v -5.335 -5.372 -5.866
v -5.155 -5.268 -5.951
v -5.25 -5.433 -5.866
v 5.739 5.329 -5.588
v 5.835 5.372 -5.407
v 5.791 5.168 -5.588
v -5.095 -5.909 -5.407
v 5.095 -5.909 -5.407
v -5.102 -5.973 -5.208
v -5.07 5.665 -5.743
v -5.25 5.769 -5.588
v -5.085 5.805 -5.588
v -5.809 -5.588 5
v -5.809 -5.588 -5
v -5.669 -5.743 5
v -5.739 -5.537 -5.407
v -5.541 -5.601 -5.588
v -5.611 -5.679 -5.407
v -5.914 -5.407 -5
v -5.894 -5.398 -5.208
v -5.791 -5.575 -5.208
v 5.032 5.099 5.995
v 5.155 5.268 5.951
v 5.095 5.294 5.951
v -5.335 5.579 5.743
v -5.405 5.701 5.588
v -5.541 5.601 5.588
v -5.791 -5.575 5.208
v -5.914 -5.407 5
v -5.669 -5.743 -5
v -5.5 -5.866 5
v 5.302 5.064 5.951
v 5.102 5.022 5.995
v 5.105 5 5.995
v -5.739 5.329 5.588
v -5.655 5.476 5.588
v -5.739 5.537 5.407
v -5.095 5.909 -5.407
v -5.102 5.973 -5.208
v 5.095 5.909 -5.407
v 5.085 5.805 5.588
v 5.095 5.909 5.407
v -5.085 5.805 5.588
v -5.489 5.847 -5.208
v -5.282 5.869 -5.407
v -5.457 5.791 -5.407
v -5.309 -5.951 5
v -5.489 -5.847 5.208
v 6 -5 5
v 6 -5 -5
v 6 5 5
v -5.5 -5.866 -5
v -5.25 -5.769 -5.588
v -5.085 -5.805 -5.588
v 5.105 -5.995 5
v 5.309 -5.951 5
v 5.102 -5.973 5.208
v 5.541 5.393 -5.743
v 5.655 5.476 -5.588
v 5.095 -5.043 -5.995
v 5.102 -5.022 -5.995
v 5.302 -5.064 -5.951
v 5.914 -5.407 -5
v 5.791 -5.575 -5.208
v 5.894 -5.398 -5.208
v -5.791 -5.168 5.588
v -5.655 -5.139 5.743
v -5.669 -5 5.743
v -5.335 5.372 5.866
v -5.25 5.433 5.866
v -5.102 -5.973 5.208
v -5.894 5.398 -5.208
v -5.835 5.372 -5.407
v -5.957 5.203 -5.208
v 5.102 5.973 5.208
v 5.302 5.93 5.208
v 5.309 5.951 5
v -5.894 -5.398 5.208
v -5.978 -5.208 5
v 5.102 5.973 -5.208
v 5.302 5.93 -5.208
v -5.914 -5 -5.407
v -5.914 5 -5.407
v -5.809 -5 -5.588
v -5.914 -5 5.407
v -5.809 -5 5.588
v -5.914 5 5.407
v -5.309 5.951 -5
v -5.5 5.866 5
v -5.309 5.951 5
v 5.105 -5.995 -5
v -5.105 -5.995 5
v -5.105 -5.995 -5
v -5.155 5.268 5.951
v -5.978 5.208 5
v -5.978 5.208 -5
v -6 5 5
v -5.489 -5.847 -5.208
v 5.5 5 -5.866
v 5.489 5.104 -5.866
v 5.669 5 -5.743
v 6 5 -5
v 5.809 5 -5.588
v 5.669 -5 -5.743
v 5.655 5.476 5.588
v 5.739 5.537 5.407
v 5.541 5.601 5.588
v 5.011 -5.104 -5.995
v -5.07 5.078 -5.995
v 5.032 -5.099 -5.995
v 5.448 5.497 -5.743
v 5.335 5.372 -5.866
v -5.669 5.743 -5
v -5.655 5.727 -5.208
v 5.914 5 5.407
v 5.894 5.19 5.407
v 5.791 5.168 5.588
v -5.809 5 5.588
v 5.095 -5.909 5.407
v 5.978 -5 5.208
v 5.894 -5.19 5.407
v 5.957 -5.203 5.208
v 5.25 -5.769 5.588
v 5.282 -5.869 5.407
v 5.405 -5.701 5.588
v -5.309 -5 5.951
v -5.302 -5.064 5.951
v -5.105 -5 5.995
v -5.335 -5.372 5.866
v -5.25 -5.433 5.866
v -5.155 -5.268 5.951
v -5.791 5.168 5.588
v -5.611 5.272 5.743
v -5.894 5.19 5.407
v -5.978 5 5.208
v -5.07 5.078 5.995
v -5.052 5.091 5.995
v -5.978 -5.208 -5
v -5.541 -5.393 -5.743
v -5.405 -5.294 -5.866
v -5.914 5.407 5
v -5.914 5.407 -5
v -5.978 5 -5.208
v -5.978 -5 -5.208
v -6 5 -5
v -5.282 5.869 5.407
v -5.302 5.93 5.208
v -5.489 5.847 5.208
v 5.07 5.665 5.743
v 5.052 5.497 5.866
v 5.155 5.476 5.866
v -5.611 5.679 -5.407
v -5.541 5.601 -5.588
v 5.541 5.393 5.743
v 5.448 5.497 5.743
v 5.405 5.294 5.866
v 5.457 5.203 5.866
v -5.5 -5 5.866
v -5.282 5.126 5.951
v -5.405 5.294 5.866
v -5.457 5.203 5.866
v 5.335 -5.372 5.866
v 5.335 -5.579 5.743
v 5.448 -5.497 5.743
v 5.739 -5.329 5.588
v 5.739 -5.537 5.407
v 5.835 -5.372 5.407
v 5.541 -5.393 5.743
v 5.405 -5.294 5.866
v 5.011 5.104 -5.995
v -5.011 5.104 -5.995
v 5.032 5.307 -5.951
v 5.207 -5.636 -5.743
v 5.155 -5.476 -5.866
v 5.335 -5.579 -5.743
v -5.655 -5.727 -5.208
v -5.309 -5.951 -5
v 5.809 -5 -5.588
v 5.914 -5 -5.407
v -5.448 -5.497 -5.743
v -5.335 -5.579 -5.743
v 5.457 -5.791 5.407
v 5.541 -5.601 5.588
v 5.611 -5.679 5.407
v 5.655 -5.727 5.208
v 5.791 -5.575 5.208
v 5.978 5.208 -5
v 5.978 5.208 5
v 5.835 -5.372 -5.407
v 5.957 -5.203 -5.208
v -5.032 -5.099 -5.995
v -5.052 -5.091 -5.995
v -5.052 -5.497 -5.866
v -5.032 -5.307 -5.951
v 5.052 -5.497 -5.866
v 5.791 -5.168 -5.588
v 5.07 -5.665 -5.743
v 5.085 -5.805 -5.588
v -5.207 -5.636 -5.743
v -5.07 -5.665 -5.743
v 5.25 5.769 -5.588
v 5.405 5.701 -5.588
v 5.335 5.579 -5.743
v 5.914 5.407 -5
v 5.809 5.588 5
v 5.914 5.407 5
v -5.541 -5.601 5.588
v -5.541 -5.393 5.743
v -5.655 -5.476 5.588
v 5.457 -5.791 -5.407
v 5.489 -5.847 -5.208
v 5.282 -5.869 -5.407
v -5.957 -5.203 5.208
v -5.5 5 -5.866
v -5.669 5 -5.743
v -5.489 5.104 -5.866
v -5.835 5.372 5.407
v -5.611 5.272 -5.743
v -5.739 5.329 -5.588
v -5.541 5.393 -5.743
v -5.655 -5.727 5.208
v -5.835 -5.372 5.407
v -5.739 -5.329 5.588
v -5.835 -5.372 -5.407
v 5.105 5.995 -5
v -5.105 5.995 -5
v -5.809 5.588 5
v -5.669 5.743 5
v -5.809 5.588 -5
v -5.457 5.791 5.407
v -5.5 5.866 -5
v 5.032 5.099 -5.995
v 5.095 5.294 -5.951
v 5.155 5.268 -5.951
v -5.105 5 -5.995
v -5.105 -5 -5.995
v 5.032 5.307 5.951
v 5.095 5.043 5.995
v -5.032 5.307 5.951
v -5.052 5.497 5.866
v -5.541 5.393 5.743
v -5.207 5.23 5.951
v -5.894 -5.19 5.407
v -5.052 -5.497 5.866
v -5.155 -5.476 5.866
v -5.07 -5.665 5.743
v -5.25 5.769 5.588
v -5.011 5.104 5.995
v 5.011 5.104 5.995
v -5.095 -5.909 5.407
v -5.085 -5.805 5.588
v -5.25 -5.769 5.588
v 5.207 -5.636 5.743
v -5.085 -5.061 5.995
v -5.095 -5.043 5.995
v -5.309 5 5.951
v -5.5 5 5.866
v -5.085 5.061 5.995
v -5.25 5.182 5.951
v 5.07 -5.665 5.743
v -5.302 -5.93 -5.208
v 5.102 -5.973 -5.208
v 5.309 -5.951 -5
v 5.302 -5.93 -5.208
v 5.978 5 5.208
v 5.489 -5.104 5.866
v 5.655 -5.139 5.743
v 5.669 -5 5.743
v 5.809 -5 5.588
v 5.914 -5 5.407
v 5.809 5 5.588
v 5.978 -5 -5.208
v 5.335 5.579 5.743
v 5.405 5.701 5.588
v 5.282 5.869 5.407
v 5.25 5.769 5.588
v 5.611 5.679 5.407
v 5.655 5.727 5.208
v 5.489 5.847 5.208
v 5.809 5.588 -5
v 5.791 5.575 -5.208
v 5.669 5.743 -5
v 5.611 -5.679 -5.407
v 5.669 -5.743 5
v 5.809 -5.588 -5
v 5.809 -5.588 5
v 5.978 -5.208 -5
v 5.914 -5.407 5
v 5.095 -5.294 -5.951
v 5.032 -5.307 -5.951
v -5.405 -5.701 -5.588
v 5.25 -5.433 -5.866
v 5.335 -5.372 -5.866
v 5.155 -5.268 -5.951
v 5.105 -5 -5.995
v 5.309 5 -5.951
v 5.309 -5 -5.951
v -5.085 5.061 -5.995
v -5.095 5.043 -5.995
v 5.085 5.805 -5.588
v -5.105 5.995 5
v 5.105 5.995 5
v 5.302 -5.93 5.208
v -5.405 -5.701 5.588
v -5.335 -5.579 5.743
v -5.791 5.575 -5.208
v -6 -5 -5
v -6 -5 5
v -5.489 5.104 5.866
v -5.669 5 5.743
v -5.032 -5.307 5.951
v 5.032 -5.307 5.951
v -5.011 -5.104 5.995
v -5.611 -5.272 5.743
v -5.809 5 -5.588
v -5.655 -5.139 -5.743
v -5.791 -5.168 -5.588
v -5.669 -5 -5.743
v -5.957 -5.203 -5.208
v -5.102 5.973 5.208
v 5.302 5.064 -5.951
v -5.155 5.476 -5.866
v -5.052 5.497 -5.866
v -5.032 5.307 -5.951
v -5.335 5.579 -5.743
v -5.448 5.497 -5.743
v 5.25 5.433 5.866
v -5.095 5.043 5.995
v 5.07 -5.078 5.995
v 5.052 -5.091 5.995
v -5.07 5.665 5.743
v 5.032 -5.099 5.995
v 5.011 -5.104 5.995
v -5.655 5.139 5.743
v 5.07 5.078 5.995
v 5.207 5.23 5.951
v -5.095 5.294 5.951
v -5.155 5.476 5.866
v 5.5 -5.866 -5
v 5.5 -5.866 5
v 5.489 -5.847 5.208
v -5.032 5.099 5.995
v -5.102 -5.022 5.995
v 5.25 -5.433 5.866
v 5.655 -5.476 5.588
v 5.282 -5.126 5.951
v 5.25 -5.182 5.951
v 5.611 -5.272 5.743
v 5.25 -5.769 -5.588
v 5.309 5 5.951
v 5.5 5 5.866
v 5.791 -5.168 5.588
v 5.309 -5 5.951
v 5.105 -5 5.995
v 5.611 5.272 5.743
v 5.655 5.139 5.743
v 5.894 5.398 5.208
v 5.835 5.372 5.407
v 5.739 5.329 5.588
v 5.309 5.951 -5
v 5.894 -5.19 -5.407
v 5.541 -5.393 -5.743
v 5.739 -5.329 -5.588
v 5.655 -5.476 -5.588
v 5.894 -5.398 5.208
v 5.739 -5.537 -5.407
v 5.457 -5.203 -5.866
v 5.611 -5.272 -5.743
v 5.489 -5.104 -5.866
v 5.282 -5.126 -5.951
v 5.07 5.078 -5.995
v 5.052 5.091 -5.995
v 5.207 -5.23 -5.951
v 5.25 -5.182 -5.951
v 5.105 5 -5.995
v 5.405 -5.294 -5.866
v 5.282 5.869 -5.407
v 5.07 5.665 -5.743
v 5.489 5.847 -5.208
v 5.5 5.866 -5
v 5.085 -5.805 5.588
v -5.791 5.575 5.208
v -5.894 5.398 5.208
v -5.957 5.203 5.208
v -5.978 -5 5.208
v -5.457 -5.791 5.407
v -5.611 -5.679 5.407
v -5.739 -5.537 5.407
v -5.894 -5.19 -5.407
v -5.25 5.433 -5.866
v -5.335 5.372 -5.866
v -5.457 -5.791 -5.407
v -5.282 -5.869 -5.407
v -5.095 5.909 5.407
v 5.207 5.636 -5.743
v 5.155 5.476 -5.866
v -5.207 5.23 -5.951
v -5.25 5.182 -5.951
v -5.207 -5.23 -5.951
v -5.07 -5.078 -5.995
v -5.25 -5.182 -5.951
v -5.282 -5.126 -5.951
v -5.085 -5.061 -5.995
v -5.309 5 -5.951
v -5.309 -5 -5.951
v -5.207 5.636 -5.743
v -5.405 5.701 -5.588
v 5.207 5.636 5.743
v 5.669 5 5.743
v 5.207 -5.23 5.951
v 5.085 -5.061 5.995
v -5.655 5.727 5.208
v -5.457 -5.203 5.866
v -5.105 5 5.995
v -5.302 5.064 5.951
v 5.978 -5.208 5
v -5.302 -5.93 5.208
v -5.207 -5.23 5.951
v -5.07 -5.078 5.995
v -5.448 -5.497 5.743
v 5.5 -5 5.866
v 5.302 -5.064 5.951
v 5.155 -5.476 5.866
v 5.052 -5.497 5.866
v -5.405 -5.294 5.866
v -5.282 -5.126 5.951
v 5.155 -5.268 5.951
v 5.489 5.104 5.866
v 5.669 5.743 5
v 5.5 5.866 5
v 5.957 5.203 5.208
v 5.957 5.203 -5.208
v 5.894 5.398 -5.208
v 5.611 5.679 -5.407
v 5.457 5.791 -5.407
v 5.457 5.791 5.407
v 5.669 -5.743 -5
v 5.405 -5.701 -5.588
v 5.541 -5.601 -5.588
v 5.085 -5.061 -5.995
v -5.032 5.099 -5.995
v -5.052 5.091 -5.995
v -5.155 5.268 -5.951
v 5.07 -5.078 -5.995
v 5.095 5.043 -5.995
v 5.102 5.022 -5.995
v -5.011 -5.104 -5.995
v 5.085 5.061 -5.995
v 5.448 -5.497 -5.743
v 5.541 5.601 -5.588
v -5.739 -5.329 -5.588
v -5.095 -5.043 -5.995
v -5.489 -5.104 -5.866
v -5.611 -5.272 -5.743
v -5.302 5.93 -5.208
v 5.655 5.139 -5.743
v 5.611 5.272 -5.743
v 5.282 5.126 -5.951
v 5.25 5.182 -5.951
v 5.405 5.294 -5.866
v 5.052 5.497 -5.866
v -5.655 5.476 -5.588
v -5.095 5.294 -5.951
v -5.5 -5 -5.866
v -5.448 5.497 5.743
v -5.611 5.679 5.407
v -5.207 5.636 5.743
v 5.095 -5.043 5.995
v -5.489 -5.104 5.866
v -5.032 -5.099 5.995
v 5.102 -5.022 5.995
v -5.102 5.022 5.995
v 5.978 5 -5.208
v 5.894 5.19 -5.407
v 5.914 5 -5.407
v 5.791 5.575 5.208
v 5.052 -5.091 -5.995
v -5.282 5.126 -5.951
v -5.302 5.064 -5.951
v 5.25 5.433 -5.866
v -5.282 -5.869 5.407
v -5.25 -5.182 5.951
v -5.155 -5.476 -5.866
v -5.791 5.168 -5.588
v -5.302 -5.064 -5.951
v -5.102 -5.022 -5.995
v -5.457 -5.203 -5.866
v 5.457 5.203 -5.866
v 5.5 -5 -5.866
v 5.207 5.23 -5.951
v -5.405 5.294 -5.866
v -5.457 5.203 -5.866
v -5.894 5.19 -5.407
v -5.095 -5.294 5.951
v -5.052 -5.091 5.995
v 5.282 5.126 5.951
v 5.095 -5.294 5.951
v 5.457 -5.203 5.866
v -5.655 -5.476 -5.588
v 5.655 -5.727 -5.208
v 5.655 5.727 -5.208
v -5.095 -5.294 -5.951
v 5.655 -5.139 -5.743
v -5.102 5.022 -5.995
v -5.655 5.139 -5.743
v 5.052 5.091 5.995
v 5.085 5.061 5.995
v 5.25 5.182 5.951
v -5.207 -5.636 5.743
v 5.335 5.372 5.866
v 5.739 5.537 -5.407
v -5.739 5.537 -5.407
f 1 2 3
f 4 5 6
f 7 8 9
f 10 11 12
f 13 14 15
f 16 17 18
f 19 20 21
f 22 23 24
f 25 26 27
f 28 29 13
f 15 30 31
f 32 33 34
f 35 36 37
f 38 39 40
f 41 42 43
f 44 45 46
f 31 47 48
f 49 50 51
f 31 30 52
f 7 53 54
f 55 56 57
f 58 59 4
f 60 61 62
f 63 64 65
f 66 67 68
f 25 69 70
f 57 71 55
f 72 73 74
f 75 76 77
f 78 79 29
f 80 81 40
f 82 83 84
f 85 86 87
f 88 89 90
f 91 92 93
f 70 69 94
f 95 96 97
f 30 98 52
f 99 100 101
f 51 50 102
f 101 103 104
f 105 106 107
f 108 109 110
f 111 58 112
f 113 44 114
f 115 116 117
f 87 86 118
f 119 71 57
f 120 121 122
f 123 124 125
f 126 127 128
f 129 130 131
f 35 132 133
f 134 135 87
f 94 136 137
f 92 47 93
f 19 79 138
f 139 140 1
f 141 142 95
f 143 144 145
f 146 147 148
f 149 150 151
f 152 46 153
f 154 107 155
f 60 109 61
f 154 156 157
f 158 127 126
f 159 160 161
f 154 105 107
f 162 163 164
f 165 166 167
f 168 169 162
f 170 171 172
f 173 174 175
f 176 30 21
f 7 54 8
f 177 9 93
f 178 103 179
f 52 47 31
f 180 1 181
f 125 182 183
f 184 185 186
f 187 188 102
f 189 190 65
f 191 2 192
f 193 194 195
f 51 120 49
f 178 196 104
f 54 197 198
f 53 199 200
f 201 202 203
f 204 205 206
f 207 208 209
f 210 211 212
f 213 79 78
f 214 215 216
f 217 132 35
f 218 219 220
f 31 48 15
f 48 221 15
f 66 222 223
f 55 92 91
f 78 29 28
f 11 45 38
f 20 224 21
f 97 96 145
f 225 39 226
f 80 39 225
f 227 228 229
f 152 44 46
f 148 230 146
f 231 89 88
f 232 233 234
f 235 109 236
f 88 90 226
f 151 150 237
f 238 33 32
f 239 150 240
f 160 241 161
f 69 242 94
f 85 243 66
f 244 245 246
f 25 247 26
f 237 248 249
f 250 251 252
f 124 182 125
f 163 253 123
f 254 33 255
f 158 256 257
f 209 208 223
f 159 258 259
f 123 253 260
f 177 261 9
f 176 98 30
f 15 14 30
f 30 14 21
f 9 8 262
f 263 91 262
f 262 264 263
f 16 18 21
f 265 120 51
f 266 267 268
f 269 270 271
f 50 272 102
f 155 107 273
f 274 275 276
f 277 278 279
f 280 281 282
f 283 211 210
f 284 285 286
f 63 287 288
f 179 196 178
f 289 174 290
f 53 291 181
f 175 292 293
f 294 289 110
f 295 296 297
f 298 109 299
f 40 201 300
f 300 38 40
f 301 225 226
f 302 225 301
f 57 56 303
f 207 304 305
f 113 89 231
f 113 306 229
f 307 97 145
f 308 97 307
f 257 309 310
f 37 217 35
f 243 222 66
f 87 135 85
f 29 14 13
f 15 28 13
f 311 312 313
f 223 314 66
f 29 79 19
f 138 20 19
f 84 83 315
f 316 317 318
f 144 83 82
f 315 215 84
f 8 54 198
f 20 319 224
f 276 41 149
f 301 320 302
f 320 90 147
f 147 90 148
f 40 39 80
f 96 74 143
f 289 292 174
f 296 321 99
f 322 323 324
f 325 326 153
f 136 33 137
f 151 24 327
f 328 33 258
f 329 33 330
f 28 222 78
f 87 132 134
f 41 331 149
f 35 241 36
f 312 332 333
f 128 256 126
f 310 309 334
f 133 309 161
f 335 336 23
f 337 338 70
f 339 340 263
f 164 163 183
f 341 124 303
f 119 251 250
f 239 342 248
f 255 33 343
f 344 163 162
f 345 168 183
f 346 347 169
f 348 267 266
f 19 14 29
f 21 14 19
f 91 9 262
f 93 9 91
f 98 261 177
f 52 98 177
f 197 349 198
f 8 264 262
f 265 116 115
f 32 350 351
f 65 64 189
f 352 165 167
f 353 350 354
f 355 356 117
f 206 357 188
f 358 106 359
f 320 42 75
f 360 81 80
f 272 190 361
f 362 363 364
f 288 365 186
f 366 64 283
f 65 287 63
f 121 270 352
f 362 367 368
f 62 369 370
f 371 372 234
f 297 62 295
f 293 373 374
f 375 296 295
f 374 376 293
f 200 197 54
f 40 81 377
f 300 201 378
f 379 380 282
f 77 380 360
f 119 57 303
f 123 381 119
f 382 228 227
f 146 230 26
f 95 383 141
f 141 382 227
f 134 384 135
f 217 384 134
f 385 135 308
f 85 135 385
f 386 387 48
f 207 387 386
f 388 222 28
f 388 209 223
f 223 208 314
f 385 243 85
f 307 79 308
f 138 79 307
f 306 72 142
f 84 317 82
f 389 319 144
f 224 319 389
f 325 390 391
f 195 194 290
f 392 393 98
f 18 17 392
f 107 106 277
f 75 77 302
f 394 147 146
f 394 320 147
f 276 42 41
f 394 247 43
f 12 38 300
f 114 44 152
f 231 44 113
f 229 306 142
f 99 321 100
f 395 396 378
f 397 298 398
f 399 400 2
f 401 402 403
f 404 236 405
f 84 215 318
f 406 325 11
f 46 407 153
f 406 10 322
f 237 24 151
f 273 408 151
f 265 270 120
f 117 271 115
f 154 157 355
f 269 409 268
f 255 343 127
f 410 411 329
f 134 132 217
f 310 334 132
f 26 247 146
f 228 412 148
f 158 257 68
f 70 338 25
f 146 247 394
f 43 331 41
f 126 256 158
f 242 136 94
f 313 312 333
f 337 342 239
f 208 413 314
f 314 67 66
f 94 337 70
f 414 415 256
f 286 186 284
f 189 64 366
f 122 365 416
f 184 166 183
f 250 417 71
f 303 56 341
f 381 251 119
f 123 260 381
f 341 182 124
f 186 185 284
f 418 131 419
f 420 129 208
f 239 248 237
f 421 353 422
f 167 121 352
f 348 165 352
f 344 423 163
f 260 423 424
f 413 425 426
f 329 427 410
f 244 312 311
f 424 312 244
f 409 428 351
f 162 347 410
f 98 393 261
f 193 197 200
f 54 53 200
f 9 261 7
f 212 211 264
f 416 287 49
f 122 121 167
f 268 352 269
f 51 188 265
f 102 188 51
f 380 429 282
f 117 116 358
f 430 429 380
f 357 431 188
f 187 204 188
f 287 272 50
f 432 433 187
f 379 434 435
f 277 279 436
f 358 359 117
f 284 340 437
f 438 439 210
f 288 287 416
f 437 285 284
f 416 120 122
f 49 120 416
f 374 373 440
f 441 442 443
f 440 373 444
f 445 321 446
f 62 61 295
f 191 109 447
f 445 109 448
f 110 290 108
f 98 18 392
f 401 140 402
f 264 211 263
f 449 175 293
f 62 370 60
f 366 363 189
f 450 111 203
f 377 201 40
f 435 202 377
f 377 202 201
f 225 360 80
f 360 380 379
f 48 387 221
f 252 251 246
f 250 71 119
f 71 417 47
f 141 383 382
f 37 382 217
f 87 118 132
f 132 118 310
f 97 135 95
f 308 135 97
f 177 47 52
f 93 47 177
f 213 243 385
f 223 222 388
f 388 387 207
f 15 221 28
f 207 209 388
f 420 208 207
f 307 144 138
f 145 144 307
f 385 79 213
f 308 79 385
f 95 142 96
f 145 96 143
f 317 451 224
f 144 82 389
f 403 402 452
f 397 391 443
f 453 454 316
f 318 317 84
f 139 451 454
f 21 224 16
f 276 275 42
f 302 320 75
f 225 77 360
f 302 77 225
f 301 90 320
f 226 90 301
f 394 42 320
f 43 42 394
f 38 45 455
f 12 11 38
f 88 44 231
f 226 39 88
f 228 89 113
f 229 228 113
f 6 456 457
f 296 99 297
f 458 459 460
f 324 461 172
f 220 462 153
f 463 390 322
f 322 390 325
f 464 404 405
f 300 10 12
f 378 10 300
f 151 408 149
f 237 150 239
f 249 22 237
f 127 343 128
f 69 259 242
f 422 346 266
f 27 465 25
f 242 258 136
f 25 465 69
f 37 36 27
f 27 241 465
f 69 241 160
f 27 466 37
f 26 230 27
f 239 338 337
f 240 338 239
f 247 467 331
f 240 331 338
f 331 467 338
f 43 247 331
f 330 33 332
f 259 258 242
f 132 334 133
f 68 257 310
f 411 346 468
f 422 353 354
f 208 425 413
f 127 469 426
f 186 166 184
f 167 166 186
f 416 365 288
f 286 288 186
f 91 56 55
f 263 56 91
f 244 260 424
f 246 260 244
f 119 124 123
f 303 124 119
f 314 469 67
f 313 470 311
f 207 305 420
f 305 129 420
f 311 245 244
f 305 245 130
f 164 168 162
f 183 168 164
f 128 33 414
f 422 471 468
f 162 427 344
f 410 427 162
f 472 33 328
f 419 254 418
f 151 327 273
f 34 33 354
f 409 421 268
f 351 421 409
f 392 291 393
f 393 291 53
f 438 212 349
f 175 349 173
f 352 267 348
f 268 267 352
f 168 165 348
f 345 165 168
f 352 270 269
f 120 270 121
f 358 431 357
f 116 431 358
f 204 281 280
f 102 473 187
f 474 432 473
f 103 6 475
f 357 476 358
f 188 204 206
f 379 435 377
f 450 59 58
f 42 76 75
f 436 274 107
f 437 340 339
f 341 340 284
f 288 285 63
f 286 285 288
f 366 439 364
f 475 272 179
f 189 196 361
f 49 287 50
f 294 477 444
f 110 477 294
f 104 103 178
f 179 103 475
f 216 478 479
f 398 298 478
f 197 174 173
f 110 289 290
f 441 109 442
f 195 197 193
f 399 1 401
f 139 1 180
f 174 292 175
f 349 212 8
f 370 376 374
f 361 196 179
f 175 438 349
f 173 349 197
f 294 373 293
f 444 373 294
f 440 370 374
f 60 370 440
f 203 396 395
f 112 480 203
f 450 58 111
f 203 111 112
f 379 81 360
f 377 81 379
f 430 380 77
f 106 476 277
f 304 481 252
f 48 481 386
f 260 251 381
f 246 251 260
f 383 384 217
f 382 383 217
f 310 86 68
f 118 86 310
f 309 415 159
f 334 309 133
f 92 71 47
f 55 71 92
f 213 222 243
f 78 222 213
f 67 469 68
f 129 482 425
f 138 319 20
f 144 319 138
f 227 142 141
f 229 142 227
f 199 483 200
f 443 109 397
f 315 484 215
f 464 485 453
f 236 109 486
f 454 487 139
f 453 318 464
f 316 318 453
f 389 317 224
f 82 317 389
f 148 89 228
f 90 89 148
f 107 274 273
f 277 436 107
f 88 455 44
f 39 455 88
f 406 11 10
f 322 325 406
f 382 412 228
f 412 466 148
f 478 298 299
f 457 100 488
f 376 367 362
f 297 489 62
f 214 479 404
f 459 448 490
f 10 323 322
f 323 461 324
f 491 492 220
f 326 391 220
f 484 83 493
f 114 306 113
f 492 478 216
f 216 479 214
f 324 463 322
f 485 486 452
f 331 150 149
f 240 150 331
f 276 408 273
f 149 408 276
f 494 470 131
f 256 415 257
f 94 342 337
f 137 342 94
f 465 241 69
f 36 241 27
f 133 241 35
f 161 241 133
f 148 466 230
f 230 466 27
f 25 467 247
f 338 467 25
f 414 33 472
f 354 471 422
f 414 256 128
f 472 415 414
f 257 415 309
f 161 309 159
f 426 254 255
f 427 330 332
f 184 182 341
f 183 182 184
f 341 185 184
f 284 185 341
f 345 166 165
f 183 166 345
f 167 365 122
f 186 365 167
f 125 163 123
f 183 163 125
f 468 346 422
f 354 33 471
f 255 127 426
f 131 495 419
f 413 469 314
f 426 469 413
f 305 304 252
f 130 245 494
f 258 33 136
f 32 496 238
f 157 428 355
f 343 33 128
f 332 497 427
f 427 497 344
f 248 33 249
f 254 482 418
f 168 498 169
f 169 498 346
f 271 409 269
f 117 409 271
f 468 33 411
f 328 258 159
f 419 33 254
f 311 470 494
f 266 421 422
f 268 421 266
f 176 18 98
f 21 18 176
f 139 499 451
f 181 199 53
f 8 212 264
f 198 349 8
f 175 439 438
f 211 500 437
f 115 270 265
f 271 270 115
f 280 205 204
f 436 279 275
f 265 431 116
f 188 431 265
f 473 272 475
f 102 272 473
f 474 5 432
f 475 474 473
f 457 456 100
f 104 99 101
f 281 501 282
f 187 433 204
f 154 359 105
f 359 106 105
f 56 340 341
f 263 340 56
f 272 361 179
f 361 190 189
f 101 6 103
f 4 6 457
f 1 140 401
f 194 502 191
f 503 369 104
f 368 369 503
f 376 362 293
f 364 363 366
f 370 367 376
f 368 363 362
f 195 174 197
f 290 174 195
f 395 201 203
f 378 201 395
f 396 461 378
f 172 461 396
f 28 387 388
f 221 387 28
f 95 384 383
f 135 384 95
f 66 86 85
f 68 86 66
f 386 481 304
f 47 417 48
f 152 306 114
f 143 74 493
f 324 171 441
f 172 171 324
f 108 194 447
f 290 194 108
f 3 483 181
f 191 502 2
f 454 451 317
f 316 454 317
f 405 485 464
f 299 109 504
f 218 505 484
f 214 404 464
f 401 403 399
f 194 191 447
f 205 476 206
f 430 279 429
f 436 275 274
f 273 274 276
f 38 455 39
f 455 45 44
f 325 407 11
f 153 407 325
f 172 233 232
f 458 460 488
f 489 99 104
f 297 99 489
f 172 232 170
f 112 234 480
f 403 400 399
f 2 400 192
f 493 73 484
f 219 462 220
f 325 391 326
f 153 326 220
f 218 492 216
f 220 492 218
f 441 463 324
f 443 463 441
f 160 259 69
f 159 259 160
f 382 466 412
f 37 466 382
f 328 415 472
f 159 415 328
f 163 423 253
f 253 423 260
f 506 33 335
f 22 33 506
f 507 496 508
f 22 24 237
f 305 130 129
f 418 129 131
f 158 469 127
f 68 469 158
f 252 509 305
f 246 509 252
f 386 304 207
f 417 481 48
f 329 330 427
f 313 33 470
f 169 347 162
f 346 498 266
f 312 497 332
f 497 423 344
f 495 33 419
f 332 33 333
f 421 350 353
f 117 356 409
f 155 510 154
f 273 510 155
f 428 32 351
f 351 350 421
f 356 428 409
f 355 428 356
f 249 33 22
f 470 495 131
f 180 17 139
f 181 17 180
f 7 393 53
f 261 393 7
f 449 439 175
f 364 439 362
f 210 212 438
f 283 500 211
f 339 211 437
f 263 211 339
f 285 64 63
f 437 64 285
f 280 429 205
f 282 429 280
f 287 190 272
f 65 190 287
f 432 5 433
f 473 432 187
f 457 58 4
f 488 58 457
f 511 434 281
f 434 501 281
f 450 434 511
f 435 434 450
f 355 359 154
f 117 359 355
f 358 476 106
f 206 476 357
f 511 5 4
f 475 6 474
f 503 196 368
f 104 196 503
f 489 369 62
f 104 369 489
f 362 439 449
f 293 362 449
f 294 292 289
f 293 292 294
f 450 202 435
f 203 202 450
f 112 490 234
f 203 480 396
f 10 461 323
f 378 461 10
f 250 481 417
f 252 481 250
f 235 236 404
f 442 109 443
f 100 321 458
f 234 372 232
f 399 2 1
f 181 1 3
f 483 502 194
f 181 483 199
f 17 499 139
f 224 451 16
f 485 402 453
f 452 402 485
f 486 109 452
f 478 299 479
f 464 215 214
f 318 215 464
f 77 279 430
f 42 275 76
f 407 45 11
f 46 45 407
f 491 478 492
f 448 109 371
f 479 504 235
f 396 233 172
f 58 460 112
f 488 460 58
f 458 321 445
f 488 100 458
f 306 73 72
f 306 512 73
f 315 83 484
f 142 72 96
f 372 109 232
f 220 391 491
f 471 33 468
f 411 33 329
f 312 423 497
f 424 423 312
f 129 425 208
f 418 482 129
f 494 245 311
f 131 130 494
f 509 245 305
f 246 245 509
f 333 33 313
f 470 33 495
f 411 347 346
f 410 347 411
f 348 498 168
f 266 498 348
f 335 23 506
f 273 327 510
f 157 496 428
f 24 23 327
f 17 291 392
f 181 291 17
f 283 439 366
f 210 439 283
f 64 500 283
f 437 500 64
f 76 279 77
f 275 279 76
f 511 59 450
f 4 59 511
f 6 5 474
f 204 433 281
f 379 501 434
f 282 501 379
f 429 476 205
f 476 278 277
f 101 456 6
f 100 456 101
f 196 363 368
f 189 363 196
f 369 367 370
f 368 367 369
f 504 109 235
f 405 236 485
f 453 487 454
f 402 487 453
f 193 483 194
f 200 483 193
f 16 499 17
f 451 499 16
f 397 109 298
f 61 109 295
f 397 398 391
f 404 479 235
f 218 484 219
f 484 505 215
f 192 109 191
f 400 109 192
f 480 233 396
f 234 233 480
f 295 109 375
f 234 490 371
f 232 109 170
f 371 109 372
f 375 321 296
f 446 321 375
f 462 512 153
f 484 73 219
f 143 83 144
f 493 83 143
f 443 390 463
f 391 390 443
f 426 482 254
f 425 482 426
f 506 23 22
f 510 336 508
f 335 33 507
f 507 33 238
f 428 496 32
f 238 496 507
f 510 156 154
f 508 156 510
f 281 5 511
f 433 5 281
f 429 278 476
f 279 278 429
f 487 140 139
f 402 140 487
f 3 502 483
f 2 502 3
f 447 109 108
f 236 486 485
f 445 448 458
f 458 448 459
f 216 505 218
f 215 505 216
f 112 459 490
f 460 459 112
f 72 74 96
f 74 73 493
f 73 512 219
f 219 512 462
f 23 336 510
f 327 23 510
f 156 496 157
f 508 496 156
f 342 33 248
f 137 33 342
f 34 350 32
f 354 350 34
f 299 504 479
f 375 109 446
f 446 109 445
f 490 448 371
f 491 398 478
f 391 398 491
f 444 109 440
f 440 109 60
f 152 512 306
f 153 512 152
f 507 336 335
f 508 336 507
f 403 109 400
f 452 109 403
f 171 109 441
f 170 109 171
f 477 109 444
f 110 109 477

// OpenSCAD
$fn = 30;

minkowski(){
	cube(10, center=true);
	sphere(1);
}
